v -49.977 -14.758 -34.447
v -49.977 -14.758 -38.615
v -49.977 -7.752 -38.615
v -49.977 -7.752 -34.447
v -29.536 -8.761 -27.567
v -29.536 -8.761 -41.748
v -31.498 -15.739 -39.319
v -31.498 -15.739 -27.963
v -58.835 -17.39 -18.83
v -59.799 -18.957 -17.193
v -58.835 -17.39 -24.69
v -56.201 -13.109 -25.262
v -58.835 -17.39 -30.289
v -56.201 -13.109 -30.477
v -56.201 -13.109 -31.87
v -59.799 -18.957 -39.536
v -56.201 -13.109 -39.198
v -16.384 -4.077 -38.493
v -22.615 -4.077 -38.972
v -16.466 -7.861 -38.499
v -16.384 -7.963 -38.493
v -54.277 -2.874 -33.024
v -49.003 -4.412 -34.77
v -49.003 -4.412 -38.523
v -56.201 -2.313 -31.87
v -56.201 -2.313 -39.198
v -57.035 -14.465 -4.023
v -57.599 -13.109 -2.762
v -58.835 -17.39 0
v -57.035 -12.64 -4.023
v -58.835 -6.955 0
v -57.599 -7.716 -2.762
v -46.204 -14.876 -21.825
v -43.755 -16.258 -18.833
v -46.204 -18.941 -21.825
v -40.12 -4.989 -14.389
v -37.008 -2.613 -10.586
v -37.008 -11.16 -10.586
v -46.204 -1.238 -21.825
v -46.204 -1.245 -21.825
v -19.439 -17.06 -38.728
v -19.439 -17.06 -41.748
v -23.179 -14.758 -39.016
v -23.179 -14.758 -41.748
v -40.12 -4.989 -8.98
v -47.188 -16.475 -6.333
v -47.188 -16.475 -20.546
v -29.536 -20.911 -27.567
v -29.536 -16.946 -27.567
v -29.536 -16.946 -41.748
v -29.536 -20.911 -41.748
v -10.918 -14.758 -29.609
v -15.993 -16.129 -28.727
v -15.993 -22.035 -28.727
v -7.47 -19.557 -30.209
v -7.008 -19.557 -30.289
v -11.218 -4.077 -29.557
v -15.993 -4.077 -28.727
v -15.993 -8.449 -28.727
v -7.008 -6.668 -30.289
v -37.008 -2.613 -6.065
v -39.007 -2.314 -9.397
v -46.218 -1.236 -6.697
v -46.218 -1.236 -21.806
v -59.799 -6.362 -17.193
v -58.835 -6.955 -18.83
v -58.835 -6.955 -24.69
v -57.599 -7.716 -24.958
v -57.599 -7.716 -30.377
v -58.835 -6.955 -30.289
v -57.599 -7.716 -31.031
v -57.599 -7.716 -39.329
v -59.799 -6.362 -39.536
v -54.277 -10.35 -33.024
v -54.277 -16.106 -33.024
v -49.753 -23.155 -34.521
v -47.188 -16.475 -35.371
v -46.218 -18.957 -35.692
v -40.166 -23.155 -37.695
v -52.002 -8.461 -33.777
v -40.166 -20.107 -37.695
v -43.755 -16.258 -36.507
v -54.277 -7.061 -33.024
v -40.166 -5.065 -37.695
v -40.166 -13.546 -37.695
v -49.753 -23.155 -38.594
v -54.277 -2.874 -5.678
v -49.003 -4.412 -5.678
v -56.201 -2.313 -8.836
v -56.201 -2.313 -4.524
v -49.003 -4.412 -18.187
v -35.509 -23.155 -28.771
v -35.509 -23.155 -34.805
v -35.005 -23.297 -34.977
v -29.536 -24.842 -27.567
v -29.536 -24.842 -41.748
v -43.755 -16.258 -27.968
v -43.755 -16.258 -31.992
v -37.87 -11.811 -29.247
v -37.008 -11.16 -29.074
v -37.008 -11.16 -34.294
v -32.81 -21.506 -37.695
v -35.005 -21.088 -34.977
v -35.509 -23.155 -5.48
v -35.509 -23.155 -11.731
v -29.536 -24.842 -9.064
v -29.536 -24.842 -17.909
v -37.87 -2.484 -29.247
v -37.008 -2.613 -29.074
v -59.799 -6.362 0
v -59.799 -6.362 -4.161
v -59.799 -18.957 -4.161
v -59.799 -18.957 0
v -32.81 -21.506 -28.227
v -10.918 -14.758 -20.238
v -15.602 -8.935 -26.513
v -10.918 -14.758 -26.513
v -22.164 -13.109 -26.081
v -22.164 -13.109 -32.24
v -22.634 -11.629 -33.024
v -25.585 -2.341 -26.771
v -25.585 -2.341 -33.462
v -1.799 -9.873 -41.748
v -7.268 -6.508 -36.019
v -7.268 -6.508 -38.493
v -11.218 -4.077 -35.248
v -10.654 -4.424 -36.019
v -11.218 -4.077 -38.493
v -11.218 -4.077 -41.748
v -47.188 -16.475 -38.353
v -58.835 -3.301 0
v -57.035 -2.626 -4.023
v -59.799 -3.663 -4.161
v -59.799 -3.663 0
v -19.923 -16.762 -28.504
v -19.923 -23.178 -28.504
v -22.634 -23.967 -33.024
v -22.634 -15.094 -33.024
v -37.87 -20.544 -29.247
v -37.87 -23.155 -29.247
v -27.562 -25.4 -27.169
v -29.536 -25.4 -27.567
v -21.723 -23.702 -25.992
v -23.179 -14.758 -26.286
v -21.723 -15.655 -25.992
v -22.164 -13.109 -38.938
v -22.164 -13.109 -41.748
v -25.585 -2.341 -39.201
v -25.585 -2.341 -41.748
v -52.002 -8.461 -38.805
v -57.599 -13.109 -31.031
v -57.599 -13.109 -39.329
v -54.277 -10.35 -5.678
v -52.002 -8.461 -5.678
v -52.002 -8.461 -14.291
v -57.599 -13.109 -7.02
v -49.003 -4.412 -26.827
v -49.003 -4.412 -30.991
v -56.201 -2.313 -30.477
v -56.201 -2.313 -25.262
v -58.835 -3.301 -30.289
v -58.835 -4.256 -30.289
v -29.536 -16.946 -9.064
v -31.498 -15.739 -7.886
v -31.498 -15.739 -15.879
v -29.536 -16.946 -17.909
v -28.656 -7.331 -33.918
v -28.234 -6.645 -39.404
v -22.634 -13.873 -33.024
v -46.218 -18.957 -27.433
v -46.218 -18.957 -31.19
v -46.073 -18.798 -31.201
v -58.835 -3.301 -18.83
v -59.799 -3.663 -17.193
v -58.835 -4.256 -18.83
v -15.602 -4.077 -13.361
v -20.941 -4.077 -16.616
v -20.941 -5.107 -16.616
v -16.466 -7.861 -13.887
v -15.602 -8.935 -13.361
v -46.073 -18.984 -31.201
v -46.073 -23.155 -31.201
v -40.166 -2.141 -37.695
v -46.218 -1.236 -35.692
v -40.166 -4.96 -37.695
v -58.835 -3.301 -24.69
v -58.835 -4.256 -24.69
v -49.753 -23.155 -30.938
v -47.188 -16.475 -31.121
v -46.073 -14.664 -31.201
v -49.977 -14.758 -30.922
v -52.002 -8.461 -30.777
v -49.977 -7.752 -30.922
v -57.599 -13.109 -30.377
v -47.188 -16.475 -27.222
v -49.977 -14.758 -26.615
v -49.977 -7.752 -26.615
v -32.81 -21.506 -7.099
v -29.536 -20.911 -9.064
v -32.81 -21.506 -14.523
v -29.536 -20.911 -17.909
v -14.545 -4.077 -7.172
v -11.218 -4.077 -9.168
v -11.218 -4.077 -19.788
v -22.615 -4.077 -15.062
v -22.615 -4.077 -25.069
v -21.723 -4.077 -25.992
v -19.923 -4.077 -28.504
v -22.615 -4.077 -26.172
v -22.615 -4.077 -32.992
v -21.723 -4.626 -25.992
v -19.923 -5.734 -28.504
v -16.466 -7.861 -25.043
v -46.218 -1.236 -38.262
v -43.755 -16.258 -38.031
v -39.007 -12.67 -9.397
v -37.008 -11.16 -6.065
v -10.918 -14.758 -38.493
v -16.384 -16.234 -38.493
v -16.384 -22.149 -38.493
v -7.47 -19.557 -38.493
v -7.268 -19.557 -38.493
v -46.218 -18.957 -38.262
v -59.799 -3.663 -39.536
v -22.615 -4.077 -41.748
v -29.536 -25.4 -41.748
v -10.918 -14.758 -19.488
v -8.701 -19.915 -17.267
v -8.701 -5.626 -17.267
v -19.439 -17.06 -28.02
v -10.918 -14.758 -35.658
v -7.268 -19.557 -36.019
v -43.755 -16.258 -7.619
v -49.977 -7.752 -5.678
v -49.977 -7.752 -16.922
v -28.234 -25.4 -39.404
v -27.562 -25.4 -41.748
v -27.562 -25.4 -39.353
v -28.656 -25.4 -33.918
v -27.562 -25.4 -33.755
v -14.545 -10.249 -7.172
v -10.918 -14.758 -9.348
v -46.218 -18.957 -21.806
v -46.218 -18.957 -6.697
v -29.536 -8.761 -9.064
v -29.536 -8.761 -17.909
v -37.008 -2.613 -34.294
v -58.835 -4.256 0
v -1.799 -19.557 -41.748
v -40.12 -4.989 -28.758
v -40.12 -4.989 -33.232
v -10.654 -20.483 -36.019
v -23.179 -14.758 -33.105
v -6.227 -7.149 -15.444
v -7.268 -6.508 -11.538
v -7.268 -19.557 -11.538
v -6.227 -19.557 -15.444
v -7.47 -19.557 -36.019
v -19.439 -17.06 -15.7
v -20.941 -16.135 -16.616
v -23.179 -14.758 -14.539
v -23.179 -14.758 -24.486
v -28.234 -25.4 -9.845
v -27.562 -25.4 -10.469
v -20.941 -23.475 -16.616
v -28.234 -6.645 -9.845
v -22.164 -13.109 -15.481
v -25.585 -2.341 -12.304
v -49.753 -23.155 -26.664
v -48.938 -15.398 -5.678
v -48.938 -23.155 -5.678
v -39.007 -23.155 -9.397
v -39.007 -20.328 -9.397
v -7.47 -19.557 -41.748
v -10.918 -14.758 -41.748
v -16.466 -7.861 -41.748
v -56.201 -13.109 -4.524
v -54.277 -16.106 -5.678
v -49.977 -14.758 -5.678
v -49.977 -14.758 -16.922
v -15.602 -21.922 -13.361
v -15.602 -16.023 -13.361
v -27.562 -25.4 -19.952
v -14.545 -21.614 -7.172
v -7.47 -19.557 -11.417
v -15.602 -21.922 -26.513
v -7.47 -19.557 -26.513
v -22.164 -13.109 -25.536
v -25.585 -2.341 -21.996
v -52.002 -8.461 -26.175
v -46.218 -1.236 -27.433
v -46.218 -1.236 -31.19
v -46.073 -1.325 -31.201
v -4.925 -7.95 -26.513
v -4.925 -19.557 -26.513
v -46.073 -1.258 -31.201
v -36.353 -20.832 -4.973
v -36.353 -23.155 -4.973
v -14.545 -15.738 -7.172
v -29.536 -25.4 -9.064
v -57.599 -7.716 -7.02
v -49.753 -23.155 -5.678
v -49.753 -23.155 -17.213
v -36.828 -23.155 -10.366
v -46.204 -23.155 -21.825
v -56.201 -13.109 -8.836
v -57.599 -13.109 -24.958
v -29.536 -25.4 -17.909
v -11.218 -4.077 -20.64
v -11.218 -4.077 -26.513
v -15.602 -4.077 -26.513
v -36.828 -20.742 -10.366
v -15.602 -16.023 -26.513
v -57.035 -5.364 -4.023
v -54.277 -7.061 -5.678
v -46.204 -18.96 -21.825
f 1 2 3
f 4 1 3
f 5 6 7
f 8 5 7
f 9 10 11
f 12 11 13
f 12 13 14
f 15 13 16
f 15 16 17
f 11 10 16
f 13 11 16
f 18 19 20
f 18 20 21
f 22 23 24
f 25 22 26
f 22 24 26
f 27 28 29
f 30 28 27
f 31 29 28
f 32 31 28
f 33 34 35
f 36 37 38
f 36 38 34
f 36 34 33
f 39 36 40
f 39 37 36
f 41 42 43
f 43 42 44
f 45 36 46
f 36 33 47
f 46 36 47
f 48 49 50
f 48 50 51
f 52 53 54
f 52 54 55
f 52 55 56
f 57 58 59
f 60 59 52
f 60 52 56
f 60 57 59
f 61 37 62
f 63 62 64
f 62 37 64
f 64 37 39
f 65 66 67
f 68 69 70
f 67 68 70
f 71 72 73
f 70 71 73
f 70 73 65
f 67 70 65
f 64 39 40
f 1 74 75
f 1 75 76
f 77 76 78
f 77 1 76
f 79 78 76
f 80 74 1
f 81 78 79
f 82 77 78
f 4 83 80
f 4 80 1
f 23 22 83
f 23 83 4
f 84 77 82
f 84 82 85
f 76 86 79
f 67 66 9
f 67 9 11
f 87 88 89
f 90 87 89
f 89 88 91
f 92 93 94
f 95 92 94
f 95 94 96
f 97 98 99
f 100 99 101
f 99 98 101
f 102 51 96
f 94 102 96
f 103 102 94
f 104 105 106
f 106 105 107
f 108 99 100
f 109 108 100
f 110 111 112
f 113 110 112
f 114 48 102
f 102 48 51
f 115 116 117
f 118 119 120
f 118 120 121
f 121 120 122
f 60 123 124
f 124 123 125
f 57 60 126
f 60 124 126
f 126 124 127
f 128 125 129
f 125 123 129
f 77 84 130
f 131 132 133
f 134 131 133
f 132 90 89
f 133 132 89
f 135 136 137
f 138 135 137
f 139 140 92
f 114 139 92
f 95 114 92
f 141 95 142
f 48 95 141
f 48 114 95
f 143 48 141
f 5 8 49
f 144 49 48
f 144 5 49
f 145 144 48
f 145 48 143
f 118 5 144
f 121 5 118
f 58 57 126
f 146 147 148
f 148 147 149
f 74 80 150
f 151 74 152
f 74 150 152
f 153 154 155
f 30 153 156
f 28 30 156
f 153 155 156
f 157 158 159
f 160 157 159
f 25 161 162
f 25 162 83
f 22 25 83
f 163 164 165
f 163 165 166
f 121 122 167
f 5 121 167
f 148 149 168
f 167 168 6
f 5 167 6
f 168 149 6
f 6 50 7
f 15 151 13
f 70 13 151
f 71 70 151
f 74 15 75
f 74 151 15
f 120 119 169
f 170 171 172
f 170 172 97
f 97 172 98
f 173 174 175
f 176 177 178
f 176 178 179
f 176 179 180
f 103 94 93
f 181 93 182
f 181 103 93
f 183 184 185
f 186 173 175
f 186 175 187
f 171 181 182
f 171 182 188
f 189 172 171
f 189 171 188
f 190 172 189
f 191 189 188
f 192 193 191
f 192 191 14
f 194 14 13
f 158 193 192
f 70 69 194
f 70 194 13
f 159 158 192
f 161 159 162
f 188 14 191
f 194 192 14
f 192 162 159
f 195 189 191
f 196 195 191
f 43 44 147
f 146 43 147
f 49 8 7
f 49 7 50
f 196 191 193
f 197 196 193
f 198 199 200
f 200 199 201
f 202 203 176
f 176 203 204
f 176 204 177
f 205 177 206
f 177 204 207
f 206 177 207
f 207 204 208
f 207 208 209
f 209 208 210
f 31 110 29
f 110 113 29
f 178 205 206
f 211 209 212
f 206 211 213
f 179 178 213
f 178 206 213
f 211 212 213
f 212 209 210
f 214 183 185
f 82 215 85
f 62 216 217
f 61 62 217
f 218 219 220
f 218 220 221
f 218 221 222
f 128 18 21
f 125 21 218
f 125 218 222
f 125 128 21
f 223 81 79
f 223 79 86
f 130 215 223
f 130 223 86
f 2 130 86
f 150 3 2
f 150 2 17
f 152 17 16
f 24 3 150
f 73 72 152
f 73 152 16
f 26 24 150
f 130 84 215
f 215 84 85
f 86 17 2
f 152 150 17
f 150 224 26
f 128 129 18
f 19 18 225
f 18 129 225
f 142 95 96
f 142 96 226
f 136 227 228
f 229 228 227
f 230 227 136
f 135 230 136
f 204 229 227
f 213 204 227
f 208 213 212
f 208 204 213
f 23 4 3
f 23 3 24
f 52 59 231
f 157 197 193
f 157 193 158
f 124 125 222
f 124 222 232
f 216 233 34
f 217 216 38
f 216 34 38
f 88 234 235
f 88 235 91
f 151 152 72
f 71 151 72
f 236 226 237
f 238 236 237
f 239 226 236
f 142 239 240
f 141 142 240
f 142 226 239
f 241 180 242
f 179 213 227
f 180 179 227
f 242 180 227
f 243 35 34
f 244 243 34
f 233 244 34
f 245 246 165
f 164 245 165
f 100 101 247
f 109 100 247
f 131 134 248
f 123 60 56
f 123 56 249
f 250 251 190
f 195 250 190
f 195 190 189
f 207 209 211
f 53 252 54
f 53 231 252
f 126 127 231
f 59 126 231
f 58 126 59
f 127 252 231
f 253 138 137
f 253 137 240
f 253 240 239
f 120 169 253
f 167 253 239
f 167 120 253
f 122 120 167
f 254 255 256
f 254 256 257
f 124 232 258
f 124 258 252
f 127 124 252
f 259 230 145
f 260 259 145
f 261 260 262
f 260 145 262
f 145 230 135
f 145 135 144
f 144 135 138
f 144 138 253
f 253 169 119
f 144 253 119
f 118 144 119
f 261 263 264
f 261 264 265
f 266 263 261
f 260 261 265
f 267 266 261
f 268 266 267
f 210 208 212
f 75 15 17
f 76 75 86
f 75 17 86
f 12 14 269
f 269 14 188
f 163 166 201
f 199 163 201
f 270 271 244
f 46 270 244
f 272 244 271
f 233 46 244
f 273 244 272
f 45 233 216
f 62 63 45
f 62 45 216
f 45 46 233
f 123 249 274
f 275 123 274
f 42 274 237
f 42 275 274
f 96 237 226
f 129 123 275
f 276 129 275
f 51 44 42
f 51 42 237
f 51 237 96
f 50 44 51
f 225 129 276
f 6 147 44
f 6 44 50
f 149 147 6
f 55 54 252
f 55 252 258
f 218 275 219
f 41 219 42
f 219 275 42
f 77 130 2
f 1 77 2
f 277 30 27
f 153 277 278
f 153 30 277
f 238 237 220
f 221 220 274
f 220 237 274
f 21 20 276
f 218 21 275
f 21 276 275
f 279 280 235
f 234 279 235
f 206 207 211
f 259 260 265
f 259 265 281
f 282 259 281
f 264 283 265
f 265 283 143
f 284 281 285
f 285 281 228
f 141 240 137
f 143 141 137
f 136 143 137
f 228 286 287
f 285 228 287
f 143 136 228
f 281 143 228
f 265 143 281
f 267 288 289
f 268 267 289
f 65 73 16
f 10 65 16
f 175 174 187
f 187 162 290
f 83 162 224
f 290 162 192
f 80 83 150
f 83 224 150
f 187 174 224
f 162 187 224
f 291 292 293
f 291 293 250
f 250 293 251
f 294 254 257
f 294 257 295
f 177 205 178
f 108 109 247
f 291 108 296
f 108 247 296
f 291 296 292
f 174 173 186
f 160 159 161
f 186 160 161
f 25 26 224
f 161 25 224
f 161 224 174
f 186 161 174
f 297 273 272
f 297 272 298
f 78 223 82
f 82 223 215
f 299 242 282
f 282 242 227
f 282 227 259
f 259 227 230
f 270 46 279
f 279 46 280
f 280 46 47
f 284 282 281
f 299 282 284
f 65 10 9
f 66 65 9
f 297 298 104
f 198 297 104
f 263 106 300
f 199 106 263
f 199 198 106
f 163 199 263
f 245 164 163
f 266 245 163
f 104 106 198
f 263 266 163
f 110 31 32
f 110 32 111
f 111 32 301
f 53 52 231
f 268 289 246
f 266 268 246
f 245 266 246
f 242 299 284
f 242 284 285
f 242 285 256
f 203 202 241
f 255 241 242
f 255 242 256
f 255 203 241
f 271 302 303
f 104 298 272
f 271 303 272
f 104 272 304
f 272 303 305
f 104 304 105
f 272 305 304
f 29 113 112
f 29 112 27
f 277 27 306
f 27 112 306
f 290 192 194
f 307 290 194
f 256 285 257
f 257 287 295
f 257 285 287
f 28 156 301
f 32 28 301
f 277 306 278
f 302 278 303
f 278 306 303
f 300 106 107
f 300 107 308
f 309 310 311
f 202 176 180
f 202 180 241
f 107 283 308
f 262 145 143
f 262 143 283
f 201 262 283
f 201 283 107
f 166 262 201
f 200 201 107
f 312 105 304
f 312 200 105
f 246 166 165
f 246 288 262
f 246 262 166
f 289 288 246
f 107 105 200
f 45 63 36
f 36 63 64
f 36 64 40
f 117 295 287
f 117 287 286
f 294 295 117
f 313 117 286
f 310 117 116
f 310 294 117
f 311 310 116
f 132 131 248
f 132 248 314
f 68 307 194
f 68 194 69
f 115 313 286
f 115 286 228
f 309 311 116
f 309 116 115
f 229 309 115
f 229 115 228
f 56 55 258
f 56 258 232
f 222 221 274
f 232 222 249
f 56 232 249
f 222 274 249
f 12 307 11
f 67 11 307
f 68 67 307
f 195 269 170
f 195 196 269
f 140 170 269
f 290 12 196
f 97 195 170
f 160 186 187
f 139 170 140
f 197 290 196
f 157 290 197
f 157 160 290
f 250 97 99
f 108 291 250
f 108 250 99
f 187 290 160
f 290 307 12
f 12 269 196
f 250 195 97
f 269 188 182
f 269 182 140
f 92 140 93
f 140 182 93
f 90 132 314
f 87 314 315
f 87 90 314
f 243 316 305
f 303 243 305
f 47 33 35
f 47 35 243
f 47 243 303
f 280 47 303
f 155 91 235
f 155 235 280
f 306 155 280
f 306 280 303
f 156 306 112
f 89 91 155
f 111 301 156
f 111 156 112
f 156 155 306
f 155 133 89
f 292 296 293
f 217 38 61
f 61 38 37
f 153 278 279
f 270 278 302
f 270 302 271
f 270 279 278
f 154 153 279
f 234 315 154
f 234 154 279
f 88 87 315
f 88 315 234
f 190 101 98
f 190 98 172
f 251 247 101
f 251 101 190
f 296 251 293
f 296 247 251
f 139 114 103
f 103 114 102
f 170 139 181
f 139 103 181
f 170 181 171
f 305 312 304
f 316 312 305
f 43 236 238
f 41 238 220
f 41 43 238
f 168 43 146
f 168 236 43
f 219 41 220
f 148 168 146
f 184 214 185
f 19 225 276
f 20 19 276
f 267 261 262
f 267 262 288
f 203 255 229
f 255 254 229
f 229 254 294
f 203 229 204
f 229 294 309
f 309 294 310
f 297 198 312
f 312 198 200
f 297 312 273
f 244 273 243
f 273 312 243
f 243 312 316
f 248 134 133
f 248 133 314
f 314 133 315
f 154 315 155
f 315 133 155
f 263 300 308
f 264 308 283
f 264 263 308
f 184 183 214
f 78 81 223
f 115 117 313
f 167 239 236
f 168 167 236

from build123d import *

# Parameters (mm, degrees)
F0_W     = 66.387452
F0_H     = 42.399473
F1_DEPTH = 25.4
F3_DEPTH = 25.4
F5_DEPTH = 76.2


with BuildPart() as f1:
    # F0 (on Front) → F1 (new body)
    with BuildSketch(Plane.XZ):
        with Locations((-33.193726, -21.199737)):
            Rectangle(F0_W, F0_H)
    extrude(amount=F1_DEPTH)

    # F2 (on Front) → F3 (cut)
    with BuildSketch(Plane.XZ):
        Polygon((-46.203654, -21.825017), (-63.001782, 0), (-65.012503, 5.034372), (-70.033558, -3.334053), (-73.549449, -26.512869), (-68.861596, -47.868628), (4.320954, -51.775172), (4.320954, 2.265323), (-49.068451, 6.822956), (-58.834806, 0), (-57.034733, -4.023443), (-54.277174, -5.677978), (-48.938233, -5.677978), (-39.007191, -9.396854), (-36.35304, -4.97327), (-28.233562, -9.844957), (-20.941351, -16.616296), (-15.602409, -13.360844), (-14.545345, -7.171656), (-7.268454, -11.537791), (-6.22671, -15.444333), (-4.924529, -26.512869), (-9.48216, -26.512869), (-15.602409, -26.512869), (-8.700852, -17.267385), (-19.922584, -28.504438), (-22.634184, -33.023771), (-28.655621, -33.91768), (-28.233562, -39.404456), (-16.383717, -38.492929), (-7.268454, -38.492929), (-7.268454, -36.018785), (-10.654123, -36.018785), (-15.993064, -28.726576), (-7.008018, -30.289192), (-1.799294, -41.748382), (-21.852877, -41.748382), (-29.535742, -41.748382), (-35.004903, -34.977041), (-46.073437, -31.200718), (-58.834806, -30.289192), (-54.277174, -33.023771), (-40.166351, -37.69498), (-61.178733, -39.664891), (-63.132003, -18.830003), (-63.132003, -11.537791), (-58.834806, -18.830003), (-58.834806, -24.689816), (-37.869699, -29.247446), (-21.722659, -25.991997), (-36.827955, -10.365828), align=None)
    extrude(amount=F3_DEPTH, mode=Mode.SUBTRACT)

    # F4 (on face) → F5 (cut)
    with BuildSketch(Plane(origin=(0, 0, -41.748382), x_dir=(1, 0, 0), z_dir=(0, 0, -1))):
        Polygon((-29.535742, 25.4), (-27.561743, 25.4), (-1.799294, 25.4), (-1.799294, 19.556552), (6.774909, 21.355854), (-6.419962, 42.797517), (-57.250202, 37.549559), (-91.586851, 32.45154), (-74.493498, -16.579399), (13.822168, -14.630158), (6.774909, 8.160982), (-1.799294, 9.873348), (-1.799294, 0), (-29.535742, 0), (-29.535742, 8.76075), (-31.498195, 15.738511), (-29.535742, 16.946173), (-29.535742, 20.91053), (-32.809701, 21.505795), (-46.218223, 18.956786), (-43.755446, 16.257836), (-37.008069, 11.159817), (-37.008069, 2.61314), (-46.218223, 1.235993), (-40.119521, 4.98904), (-47.187853, 16.47508), (-49.977429, 14.758418), (-49.977429, 7.751942), (-49.003407, 4.412441), (-56.200609, 2.313257), (-59.799209, 3.662731), (-52.00224, 8.460866), (-57.598993, 13.10906), (-57.598993, 7.715662), (-59.799209, 6.361682), (-59.799209, 13.10906), (-59.799209, 18.956786), (-56.200609, 13.10906), (-49.753115, 23.155155), (-35.508655, 23.155155), (-29.535742, 24.842384), align=None)
        Polygon((-27.561743, 25.4), (-7.469554, 19.556552), (-1.799294, 19.556552), (-1.799294, 25.4), align=None)
        Polygon((-1.799294, 0), (-1.799294, 9.873348), (-11.218095, 4.077162), (-22.614953, 4.077162), (-16.466055, 7.861099), (-10.918212, 14.758418), (-19.439298, 17.05967), (-23.178832, 14.758418), (-22.163842, 13.10906), (-25.585411, 2.341461), (-29.535742, 8.76075), (-29.535742, 0), align=None)
    extrude(amount=-F5_DEPTH, mode=Mode.SUBTRACT)


solid = f1.part
